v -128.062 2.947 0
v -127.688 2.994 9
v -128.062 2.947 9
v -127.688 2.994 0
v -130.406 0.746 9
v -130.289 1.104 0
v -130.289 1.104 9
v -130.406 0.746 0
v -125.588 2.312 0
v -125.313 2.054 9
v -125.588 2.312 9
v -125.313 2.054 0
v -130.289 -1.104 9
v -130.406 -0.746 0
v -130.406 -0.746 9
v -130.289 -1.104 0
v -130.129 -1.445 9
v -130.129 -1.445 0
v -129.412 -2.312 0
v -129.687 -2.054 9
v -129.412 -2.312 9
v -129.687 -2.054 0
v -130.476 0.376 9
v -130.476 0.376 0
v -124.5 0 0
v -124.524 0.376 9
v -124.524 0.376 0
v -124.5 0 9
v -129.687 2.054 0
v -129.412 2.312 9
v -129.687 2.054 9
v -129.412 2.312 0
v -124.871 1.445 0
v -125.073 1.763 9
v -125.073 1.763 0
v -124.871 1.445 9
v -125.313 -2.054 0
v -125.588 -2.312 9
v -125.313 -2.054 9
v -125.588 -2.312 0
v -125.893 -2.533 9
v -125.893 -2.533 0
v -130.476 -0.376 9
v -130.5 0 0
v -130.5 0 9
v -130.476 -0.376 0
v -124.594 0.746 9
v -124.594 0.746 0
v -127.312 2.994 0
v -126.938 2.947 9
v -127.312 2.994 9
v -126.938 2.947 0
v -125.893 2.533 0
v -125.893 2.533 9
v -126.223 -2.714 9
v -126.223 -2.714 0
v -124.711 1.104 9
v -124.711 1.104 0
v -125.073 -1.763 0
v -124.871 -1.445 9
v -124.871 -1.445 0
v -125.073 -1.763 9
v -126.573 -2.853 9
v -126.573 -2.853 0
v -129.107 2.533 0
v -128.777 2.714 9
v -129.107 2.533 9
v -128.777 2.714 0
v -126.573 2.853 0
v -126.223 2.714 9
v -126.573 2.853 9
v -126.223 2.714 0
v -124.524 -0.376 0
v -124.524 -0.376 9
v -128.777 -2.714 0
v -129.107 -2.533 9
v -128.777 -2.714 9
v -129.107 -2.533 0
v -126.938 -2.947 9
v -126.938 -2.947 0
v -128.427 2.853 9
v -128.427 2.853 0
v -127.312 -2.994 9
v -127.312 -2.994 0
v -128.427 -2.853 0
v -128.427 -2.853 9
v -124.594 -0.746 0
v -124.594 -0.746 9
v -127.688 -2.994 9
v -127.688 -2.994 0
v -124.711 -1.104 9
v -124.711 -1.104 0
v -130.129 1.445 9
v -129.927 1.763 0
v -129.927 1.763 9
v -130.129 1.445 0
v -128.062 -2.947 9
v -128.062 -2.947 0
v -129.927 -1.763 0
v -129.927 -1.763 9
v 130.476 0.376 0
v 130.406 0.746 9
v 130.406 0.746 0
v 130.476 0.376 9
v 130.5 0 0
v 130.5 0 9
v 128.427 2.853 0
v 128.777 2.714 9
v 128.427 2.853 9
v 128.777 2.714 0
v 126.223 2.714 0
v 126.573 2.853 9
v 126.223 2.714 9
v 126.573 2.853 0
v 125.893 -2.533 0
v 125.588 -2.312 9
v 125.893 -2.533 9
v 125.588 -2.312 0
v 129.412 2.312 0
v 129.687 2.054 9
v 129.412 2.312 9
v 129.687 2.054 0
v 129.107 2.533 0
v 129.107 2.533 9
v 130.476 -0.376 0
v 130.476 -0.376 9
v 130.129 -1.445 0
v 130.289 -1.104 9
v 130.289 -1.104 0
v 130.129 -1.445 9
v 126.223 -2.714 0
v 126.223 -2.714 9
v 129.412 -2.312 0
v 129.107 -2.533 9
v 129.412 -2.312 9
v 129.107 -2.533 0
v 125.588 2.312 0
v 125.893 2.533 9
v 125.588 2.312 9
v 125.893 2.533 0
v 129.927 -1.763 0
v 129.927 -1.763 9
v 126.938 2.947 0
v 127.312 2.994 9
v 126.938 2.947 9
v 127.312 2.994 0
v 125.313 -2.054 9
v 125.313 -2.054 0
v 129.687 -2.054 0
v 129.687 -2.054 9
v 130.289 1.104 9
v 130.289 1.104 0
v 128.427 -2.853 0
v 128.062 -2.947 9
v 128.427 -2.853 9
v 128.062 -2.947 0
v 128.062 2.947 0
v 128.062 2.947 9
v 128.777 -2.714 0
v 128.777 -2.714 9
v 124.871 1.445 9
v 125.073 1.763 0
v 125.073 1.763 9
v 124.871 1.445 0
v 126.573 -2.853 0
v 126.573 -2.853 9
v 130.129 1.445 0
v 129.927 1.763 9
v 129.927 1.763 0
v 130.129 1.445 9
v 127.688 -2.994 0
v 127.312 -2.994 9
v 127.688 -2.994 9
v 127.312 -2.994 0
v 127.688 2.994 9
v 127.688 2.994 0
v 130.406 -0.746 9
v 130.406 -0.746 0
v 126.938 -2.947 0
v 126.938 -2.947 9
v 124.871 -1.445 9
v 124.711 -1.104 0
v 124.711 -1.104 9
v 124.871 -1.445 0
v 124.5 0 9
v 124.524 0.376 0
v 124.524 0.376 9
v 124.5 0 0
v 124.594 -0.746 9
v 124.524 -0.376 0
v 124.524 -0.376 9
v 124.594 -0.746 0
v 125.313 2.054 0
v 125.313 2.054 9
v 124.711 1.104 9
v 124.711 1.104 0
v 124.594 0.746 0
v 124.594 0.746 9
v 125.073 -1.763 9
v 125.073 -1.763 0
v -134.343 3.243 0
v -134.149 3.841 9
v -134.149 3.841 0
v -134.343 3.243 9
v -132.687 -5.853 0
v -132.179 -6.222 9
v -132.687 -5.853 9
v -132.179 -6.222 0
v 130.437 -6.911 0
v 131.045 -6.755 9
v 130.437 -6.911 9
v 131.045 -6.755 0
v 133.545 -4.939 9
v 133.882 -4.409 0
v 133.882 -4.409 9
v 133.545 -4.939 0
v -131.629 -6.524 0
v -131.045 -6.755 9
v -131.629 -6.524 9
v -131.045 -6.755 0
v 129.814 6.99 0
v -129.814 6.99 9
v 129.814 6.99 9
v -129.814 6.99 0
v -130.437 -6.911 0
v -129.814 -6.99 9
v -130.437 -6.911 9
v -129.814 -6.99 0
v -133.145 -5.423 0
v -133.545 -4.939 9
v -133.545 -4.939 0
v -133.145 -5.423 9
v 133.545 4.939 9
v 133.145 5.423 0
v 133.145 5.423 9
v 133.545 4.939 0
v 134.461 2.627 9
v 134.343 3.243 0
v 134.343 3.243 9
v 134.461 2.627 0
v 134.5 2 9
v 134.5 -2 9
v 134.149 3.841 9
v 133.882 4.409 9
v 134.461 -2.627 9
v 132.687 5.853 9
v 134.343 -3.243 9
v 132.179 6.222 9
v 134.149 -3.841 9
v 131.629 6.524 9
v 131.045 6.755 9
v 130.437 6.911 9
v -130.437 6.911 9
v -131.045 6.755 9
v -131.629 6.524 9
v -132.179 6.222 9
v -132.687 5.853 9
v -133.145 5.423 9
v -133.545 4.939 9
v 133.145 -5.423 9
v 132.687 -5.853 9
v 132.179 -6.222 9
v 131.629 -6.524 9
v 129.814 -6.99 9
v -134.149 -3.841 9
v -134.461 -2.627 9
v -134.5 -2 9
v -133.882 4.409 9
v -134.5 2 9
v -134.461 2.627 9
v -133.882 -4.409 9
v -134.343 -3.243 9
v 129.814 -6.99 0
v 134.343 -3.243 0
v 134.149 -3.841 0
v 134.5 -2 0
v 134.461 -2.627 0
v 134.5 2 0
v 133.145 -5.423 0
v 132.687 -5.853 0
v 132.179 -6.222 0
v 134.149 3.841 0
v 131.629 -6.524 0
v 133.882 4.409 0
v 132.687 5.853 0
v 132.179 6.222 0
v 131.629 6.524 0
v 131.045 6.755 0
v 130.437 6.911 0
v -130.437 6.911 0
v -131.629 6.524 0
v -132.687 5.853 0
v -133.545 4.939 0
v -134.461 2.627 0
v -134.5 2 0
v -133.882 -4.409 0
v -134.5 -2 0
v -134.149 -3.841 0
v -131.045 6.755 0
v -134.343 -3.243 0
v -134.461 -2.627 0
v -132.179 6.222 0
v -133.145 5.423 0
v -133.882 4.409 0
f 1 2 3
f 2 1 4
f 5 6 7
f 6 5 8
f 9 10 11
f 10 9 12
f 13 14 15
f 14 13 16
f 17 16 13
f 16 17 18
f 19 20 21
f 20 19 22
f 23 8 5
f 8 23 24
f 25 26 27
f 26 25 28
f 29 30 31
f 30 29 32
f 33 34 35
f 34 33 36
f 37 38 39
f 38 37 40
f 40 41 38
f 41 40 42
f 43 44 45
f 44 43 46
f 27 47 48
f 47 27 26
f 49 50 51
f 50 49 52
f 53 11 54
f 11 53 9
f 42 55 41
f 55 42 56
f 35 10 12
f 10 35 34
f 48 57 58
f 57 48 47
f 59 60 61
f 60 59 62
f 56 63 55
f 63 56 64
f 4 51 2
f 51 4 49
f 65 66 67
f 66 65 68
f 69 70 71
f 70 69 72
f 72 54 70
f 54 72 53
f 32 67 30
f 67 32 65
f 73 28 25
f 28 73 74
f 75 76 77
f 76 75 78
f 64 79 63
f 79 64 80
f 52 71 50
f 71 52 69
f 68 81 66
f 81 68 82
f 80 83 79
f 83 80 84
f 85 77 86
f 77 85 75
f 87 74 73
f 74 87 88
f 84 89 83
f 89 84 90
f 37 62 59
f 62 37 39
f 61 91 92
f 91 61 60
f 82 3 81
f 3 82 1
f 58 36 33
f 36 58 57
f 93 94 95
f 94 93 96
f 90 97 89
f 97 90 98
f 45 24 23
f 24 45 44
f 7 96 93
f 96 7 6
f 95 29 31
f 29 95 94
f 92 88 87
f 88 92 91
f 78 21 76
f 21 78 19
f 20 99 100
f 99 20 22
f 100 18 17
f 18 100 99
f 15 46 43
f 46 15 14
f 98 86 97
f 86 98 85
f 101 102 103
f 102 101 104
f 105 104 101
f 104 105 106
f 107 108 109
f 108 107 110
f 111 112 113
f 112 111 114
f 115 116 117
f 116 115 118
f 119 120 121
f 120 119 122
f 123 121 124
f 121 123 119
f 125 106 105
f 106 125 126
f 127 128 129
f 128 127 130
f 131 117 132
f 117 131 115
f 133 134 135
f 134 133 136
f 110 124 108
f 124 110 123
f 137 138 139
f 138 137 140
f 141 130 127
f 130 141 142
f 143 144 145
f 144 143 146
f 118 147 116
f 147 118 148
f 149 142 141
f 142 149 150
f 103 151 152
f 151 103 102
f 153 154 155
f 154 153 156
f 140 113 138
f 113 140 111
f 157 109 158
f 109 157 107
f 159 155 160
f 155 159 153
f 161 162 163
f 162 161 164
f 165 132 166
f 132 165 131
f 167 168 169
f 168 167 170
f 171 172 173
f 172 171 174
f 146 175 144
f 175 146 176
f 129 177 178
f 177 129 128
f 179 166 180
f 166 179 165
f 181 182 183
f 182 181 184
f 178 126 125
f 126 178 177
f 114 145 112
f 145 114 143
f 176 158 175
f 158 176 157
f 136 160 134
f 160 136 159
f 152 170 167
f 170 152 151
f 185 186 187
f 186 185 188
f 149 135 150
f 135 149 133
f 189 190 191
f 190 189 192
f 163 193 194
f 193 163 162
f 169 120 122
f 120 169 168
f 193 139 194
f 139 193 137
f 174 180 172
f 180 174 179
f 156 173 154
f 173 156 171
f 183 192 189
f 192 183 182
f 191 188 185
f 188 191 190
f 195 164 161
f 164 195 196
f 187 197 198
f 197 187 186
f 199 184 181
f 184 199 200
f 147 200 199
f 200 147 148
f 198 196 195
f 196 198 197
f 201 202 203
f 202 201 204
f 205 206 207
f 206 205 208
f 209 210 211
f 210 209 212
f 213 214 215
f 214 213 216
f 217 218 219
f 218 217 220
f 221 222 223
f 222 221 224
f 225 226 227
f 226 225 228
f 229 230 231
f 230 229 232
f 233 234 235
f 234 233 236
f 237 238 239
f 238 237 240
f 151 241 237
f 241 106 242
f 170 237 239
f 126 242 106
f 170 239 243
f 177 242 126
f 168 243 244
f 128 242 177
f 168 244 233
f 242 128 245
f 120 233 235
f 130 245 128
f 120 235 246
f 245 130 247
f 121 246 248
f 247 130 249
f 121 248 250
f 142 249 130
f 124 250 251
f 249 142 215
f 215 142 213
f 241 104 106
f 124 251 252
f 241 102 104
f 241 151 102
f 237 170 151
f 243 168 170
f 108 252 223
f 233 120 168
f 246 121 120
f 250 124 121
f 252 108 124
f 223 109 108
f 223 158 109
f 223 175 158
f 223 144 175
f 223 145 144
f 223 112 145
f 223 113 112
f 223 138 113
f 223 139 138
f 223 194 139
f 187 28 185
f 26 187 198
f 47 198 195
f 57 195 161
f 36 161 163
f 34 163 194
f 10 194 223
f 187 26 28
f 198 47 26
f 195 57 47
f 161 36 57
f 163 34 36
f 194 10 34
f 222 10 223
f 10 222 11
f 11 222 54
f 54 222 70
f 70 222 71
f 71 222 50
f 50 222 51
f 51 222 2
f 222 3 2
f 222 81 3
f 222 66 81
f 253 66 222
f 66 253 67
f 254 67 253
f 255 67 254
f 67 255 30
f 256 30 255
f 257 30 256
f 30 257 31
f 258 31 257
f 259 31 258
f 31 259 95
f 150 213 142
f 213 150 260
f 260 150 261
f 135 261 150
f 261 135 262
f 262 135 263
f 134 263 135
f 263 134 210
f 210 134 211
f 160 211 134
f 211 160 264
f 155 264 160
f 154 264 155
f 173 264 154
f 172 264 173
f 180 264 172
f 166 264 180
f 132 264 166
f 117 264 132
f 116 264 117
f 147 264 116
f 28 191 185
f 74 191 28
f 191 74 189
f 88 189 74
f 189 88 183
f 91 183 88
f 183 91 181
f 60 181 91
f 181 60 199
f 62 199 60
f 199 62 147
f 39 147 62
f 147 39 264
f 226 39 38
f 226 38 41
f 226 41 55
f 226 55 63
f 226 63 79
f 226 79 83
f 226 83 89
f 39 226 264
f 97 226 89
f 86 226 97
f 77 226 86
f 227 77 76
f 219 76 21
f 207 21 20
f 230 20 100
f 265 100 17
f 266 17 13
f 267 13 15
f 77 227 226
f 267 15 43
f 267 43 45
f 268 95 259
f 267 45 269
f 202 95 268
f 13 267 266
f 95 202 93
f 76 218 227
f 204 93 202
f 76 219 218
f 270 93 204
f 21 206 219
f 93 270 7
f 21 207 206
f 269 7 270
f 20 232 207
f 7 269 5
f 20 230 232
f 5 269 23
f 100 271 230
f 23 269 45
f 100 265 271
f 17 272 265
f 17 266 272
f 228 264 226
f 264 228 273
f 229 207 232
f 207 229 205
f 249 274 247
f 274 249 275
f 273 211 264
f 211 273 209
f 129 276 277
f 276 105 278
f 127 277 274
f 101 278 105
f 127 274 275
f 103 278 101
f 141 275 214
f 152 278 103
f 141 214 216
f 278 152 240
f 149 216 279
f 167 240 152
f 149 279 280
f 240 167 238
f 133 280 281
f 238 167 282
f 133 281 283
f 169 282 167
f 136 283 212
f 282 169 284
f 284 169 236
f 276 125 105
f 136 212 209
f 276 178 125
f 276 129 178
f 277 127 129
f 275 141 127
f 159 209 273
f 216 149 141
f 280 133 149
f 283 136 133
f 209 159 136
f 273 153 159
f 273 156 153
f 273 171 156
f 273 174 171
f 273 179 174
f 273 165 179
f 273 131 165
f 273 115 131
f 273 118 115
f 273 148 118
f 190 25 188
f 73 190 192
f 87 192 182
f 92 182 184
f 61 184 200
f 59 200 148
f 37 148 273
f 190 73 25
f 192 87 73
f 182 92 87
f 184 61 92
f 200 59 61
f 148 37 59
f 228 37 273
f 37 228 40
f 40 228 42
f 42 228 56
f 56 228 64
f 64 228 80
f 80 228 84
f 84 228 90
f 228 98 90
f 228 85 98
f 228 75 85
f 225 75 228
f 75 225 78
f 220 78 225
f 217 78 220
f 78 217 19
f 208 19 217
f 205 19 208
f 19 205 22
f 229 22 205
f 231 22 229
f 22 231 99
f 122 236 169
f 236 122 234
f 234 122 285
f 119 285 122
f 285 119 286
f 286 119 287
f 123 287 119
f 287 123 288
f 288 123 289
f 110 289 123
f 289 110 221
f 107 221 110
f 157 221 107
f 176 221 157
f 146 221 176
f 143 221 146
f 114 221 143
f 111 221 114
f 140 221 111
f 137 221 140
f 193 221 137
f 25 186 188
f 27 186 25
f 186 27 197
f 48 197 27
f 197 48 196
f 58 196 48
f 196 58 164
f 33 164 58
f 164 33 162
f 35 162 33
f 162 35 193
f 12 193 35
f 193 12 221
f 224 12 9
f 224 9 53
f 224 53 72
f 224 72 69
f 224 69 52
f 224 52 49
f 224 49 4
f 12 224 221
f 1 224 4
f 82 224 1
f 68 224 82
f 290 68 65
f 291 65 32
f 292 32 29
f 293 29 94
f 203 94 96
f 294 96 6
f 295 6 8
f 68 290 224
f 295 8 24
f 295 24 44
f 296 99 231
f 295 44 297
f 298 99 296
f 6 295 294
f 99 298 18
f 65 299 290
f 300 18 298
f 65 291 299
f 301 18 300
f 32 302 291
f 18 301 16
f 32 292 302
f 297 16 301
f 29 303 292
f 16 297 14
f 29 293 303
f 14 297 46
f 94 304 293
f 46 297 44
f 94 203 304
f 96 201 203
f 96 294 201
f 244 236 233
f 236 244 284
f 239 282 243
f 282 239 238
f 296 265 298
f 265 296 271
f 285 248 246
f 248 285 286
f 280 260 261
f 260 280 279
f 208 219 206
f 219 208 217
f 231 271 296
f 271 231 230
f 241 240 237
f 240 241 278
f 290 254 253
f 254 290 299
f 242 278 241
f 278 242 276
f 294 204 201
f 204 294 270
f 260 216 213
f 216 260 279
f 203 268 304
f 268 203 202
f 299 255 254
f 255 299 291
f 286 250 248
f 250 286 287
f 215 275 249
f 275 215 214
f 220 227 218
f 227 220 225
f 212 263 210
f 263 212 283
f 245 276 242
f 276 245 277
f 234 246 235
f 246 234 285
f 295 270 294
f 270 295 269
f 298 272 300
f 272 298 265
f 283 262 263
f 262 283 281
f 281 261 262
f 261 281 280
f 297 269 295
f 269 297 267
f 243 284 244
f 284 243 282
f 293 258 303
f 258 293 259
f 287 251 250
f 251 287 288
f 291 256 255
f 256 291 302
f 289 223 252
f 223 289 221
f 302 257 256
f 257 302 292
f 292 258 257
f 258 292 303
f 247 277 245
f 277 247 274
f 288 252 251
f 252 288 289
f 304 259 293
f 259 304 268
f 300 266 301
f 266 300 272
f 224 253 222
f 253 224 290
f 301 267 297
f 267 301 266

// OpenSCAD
$fn = 50;


difference() {
	union() {
		hull() {
			translate(v = [-129.5000000000, 2.0000000000, 0]) {
				cylinder(h = 9, r = 5);
			}
			translate(v = [129.5000000000, 2.0000000000, 0]) {
				cylinder(h = 9, r = 5);
			}
			translate(v = [-129.5000000000, -2.0000000000, 0]) {
				cylinder(h = 9, r = 5);
			}
			translate(v = [129.5000000000, -2.0000000000, 0]) {
				cylinder(h = 9, r = 5);
			}
		}
	}
	union() {
		translate(v = [-127.5000000000, 0.0000000000, -100.0000000000]) {
			cylinder(h = 200, r = 3.0000000000);
		}
		translate(v = [-127.5000000000, 0.0000000000, -100.0000000000]) {
			cylinder(h = 200, r = 3.0000000000);
		}
		translate(v = [127.5000000000, 0.0000000000, -100.0000000000]) {
			cylinder(h = 200, r = 3.0000000000);
		}
		translate(v = [127.5000000000, 0.0000000000, -100.0000000000]) {
			cylinder(h = 200, r = 3.0000000000);
		}
	}
}
